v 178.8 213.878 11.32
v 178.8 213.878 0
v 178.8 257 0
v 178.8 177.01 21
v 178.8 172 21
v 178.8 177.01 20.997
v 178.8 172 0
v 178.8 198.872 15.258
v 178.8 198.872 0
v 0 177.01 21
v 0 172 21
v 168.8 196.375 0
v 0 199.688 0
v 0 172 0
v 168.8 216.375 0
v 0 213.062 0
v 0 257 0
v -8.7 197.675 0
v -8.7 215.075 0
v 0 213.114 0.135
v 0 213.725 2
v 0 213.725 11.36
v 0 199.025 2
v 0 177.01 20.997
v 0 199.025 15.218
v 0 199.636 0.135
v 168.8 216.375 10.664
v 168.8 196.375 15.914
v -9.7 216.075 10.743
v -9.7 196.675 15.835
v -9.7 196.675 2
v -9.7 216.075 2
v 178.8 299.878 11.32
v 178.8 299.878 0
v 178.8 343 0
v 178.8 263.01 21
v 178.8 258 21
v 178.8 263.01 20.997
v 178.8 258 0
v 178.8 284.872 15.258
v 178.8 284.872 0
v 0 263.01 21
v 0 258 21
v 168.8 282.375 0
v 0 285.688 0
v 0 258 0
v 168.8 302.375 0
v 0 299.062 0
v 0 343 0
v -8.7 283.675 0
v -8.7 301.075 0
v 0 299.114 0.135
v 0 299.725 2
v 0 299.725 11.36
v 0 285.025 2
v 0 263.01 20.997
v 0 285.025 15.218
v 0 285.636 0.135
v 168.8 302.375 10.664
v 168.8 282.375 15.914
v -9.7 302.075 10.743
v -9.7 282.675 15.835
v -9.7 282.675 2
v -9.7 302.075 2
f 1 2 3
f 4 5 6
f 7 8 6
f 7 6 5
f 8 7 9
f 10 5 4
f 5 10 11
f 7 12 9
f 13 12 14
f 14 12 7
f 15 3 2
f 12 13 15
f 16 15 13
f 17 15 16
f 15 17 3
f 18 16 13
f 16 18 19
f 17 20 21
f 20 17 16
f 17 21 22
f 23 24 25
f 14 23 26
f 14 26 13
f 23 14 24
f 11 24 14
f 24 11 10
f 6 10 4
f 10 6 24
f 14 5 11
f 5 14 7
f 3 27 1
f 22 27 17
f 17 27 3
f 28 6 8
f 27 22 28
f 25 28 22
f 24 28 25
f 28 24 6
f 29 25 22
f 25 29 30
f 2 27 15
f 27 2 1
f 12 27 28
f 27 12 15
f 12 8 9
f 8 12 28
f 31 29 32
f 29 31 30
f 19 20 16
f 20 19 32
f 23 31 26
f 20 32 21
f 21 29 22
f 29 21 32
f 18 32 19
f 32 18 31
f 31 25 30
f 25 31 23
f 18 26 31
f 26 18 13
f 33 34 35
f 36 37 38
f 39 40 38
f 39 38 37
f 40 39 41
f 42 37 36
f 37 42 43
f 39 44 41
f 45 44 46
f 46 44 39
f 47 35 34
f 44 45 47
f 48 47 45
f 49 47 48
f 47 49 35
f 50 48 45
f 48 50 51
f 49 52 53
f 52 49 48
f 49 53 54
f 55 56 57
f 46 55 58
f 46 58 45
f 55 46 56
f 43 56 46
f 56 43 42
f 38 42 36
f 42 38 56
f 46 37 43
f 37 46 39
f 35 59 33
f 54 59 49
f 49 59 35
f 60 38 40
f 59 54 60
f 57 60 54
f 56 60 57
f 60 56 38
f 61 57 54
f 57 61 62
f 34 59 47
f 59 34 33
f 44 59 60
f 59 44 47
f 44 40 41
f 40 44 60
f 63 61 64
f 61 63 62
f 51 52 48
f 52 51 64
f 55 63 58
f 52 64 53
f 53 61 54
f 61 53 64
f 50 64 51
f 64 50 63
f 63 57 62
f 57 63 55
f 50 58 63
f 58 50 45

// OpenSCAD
// Copyright 2023 Heikki Suonsivu
// Licensed under Creative Commons CC-BY-NC-SA, see https://creativecommons.org/licenses/by-nc-sa/4.0/
// For commercial licensing, please contact directly, hsu-3d@suonsivu.net, +358 40 551 9679

// width=x, depth=y
final=1; // 0 for test print
vertical=0; // vertical prints parts in vertical mode, which makes them more difficult to attach to each other, but can be printed in a smaller printer
printerwidth=220;
thickness=21;//23;
flat=5;
slopedepth=80;
totaldepth=flat+slopedepth;
length=95;
tappidiameter=10;
tappitolerance=0.6;
tolerance=0.3;
$fn=90;
connectorwidth=vertical?5:10;
connectordepth=vertical?10:20;
connectorendnarrowing=1;
narrowing=0.75;
connectorposition=(vertical?(thickness/2-connectorwidth/2)*0.6:(totaldepth/2-connectordepth/2)*0.75);
maxwidth=295*3+9;//960;
printparts=2; // Multiphase print if all do not fit into the print bed

module male(x,y,h) {
  linear_extrude(height=h) {
    polygon(points=[[0,0],[0,y],[x,y-(y-y*narrowing)/2],[x,(y-y*narrowing)/2]]);
  }
}

module triangle(x,y,z,mode) {
  if (mode==0) {
    translate([0,y,0]) rotate([90,0,0]) linear_extrude(height=y) polygon(points=[[0,0],[x,z],[x,0]]);
  } else if (mode==1) {
    translate([0,y,0]) rotate([90,0,0]) linear_extrude(height=y) polygon(points=[[0,0],[0,z],[x,z]]);
  } else if (mode==2) {
    translate([0,y,0]) rotate([90,0,0]) linear_extrude(height=y) polygon(points=[[0,0],[0,z],[x,0]]);
  } else if (mode==3) {
    translate([0,y,0]) rotate([90,0,0]) linear_extrude(height=y) polygon(points=[[0,z],[x,z],[x,0]]);
  } else if (mode==4) {
    translate([x,0,0]) rotate([0,0,90]) linear_extrude(height=z) polygon(points=[[0,0],[y,x],[y,0]]);
  } else if (mode==5) {
    translate([x,0,0]) rotate([0,0,90]) linear_extrude(height=z) polygon(points=[[0,0],[0,x],[y,x]]);
  } else if (mode==6) {
    translate([x,0,0]) rotate([0,0,90]) linear_extrude(height=z) polygon(points=[[0,0],[0,x],[y,0]]);
  } else if (mode==7) {
    translate([x,0,0]) rotate([0,0,90]) linear_extrude(height=z) polygon(points=[[0,x],[y,x],[y,0]]);
  } else if (mode==8) {
    translate([0,0,z]) rotate([0,90,0]) linear_extrude(height=x) polygon(points=[[0,0],[z,y],[z,0]]);
  } else if (mode==9) {
    translate([0,0,z]) rotate([0,90,0]) linear_extrude(height=x) polygon(points=[[0,0],[0,y],[z,y]]);
  } else if (mode==10) {
    translate([0,0,z]) rotate([0,90,0]) linear_extrude(height=x) polygon(points=[[0,0],[0,y],[z,0]]);
  } else if (mode==11) {
    translate([0,0,z]) rotate([0,90,0]) linear_extrude(height=x) polygon(points=[[0,y],[z,y],[z,0]]);
  }
}

//for (x=[0:1:11]) translate([x*20,0,0]) triangle(10,20,40,x);

module lista(t,l) {
  union() {
    difference() {
      union() {
	cube([l,flat+0.01,thickness]);
	translate([0,totaldepth,0]) rotate([0,0,-90]) triangle(slopedepth,l,thickness,0);
      }
      
      if (t=="right") {
	// Nothing here
      }

      if (t=="center") {
	// Left locking hole
	if (vertical) {
	  translate([l-connectorwidth,totaldepth-0.01,connectorposition-0.01]) rotate([90,0,0]) male(connectorwidth+0.01,connectordepth,totaldepth);
	} else {
	  translate([l-connectorwidth,connectorposition,-0.01]) male(connectorwidth+0.01,connectordepth,thickness+0.02);
	}
      }
      
      if (t=="left") {
	// Left locking hole
	if (vertical) {
	  translate([l-connectorwidth,totaldepth-0.01,connectorposition-0.01]) rotate([90,0,0]) male(connectorwidth+0.01,connectordepth,totaldepth);
	} else {
	  translate([l-connectorwidth+0.01,connectorposition,-0.01]) male(connectorwidth+0.01,connectordepth,thickness+0.02);
	}
      }
    }

    if (t=="center") {
      intersection() {
	if (vertical) {
	  hull() {
	    translate([-connectorwidth+connectorendnarrowing+tolerance,connectorendnarrowing,connectorposition+connectorendnarrowing+tolerance-0.01]) rotate([90,0,0]) male(connectorwidth-connectorendnarrowing,connectordepth-connectorendnarrowing*2-tolerance*2,connectorendnarrowing);
	    translate([-connectorwidth+tolerance,totaldepth+tolerance,connectorposition+tolerance-0.01]) rotate([90,0,0]) male(connectorwidth,connectordepth-tolerance*2,totaldepth-connectorendnarrowing*2+tolerance);
	  }
	} else {
	  hull() {
	    translate([-connectorwidth+tolerance,connectorposition+tolerance,connectorendnarrowing*2]) male(connectorwidth+0.01,connectordepth-tolerance*2,thickness);
	    translate([-connectorwidth+connectorendnarrowing+tolerance,connectorposition+connectorendnarrowing+tolerance,0]) male(connectorwidth-tolerance*2,connectordepth-connectorendnarrowing*2-tolerance*2,thickness);
	  }
	  //	  translate([-connectorwidth+tolerance,connectorposition+tolerance,0]) male(connectorwidth+0.01,connectordepth-tolerance*2,thickness);
	}
	
	translate([-connectorwidth,totaldepth,0]) rotate([0,0,-90]) union() {
	  triangle(slopedepth,l,thickness,0);
	  translate([slopedepth,0,0]) cube([connectorwidth+0.01,flat+0.01,thickness]);
	}
      }
    }
    
    if (t=="right") {
      intersection() {
	if (vertical) {
	  //translate([-connectorwidth+tolerance,totaldepth+tolerance,connectorposition+tolerance-0.01]) rotate([90,0,0]) male(connectorwidth,connectordepth-tolerance*2,totaldepth+tolerance);
	  hull() {
	    translate([-connectorwidth+connectorendnarrowing+tolerance,connectorendnarrowing,connectorposition+connectorendnarrowing+tolerance-0.01]) rotate([90,0,0]) male(connectorwidth-connectorendnarrowing,connectordepth-connectorendnarrowing*2-tolerance*2,connectorendnarrowing);
	    translate([-connectorwidth+tolerance,totaldepth+tolerance,connectorposition+tolerance-0.01]) rotate([90,0,0]) male(connectorwidth,connectordepth-tolerance*2,totaldepth-connectorendnarrowing*2+tolerance);
	  }
	} else {
	  hull() {
	    translate([-connectorwidth+tolerance,connectorposition+tolerance,connectorendnarrowing*2]) male(connectorwidth+0.01,connectordepth-tolerance*2,thickness);
	    translate([-connectorwidth+connectorendnarrowing+tolerance,connectorposition+connectorendnarrowing+tolerance,0]) male(connectorwidth-tolerance*2,connectordepth-connectorendnarrowing*2-tolerance*2,thickness);
	  }
	}
	
	translate([-connectorwidth,totaldepth,0]) rotate([0,0,-90]) union() {
	  triangle(slopedepth,l,thickness,0);
	  translate([slopedepth,0,0]) cube([connectorwidth+0.01,flat+0.01,thickness]);
	}
      }
    }

  }
}

// 3 pieces, 33, 30, 33

if (final) rotate([0,0,vertical?90:0]) {
  i=0;

  sections=floor(maxwidth/printerwidth);
  
  totalsections=(sections*printerwidth < maxwidth)?sections+1:sections;
  
  sectionwidth=maxwidth/totalsections;

  partsonego=vertical ? floor(printerwidth/(thickness+1)) : floor(printerwidth/(totaldepth+1));

  
  echo("totalsections, sectionwidth, width, partsonego, totaldepth ", totalsections, sectionwidth, totalsections*sectionwidth, partsonego, totaldepth);

  if (vertical) {
    if ((thickness+1) * totalsections >= printerwidth) {
      echo("Printer too small to print all in one go, use printparts to get other parts");
    }
  } else {
    if ((totaldepth+1) * totalsections >= printerwidth) {
      echo("Printer too small to print all in one go, use printparts to get other parts");
    }
  }

  if (printparts==1) {
    if (vertical) rotate([90,0,0]) {
	lista("left",sectionwidth);
      } else {
      lista("left",sectionwidth);
    }
    if (vertical) {
      translate([0,(thickness+1)*1,0]) rotate([90,0,0]) lista("right",sectionwidth);
    } else {
      translate([0,(totaldepth+1)*1,0]) lista("right",sectionwidth);
    }
  }
  
  for (i=[2:1:totalsections-1]) {
    echo("i ",i);
    if (i >= (printparts-1)*partsonego && i < printparts*partsonego) {
      if (vertical) {
	translate([0,(thickness+1)*i,0]) rotate([90,0,0]) lista("center",sectionwidth);
      } else {
	translate([0,(totaldepth+1)*i,0]) lista("center",sectionwidth);
      }
    }
  }
	   } else {
  if (vertical) {
    rotate([90,0,0]) lista("right",10);
  } else {
    lista("right",10);
  }

  if (vertical) {
    translate([0,thickness+1,0]) rotate([90,0,0]) lista("center",20);
  } else {
    translate([0,totaldepth+1,0]) lista("center",20);
  }

  if (vertical) {
    translate([0,(thickness+1)*2,0]) rotate([90,0,0]) lista("left",20);
  } else {
    translate([0,(totaldepth+1)*2,0]) lista("left",20);
  }
 }
